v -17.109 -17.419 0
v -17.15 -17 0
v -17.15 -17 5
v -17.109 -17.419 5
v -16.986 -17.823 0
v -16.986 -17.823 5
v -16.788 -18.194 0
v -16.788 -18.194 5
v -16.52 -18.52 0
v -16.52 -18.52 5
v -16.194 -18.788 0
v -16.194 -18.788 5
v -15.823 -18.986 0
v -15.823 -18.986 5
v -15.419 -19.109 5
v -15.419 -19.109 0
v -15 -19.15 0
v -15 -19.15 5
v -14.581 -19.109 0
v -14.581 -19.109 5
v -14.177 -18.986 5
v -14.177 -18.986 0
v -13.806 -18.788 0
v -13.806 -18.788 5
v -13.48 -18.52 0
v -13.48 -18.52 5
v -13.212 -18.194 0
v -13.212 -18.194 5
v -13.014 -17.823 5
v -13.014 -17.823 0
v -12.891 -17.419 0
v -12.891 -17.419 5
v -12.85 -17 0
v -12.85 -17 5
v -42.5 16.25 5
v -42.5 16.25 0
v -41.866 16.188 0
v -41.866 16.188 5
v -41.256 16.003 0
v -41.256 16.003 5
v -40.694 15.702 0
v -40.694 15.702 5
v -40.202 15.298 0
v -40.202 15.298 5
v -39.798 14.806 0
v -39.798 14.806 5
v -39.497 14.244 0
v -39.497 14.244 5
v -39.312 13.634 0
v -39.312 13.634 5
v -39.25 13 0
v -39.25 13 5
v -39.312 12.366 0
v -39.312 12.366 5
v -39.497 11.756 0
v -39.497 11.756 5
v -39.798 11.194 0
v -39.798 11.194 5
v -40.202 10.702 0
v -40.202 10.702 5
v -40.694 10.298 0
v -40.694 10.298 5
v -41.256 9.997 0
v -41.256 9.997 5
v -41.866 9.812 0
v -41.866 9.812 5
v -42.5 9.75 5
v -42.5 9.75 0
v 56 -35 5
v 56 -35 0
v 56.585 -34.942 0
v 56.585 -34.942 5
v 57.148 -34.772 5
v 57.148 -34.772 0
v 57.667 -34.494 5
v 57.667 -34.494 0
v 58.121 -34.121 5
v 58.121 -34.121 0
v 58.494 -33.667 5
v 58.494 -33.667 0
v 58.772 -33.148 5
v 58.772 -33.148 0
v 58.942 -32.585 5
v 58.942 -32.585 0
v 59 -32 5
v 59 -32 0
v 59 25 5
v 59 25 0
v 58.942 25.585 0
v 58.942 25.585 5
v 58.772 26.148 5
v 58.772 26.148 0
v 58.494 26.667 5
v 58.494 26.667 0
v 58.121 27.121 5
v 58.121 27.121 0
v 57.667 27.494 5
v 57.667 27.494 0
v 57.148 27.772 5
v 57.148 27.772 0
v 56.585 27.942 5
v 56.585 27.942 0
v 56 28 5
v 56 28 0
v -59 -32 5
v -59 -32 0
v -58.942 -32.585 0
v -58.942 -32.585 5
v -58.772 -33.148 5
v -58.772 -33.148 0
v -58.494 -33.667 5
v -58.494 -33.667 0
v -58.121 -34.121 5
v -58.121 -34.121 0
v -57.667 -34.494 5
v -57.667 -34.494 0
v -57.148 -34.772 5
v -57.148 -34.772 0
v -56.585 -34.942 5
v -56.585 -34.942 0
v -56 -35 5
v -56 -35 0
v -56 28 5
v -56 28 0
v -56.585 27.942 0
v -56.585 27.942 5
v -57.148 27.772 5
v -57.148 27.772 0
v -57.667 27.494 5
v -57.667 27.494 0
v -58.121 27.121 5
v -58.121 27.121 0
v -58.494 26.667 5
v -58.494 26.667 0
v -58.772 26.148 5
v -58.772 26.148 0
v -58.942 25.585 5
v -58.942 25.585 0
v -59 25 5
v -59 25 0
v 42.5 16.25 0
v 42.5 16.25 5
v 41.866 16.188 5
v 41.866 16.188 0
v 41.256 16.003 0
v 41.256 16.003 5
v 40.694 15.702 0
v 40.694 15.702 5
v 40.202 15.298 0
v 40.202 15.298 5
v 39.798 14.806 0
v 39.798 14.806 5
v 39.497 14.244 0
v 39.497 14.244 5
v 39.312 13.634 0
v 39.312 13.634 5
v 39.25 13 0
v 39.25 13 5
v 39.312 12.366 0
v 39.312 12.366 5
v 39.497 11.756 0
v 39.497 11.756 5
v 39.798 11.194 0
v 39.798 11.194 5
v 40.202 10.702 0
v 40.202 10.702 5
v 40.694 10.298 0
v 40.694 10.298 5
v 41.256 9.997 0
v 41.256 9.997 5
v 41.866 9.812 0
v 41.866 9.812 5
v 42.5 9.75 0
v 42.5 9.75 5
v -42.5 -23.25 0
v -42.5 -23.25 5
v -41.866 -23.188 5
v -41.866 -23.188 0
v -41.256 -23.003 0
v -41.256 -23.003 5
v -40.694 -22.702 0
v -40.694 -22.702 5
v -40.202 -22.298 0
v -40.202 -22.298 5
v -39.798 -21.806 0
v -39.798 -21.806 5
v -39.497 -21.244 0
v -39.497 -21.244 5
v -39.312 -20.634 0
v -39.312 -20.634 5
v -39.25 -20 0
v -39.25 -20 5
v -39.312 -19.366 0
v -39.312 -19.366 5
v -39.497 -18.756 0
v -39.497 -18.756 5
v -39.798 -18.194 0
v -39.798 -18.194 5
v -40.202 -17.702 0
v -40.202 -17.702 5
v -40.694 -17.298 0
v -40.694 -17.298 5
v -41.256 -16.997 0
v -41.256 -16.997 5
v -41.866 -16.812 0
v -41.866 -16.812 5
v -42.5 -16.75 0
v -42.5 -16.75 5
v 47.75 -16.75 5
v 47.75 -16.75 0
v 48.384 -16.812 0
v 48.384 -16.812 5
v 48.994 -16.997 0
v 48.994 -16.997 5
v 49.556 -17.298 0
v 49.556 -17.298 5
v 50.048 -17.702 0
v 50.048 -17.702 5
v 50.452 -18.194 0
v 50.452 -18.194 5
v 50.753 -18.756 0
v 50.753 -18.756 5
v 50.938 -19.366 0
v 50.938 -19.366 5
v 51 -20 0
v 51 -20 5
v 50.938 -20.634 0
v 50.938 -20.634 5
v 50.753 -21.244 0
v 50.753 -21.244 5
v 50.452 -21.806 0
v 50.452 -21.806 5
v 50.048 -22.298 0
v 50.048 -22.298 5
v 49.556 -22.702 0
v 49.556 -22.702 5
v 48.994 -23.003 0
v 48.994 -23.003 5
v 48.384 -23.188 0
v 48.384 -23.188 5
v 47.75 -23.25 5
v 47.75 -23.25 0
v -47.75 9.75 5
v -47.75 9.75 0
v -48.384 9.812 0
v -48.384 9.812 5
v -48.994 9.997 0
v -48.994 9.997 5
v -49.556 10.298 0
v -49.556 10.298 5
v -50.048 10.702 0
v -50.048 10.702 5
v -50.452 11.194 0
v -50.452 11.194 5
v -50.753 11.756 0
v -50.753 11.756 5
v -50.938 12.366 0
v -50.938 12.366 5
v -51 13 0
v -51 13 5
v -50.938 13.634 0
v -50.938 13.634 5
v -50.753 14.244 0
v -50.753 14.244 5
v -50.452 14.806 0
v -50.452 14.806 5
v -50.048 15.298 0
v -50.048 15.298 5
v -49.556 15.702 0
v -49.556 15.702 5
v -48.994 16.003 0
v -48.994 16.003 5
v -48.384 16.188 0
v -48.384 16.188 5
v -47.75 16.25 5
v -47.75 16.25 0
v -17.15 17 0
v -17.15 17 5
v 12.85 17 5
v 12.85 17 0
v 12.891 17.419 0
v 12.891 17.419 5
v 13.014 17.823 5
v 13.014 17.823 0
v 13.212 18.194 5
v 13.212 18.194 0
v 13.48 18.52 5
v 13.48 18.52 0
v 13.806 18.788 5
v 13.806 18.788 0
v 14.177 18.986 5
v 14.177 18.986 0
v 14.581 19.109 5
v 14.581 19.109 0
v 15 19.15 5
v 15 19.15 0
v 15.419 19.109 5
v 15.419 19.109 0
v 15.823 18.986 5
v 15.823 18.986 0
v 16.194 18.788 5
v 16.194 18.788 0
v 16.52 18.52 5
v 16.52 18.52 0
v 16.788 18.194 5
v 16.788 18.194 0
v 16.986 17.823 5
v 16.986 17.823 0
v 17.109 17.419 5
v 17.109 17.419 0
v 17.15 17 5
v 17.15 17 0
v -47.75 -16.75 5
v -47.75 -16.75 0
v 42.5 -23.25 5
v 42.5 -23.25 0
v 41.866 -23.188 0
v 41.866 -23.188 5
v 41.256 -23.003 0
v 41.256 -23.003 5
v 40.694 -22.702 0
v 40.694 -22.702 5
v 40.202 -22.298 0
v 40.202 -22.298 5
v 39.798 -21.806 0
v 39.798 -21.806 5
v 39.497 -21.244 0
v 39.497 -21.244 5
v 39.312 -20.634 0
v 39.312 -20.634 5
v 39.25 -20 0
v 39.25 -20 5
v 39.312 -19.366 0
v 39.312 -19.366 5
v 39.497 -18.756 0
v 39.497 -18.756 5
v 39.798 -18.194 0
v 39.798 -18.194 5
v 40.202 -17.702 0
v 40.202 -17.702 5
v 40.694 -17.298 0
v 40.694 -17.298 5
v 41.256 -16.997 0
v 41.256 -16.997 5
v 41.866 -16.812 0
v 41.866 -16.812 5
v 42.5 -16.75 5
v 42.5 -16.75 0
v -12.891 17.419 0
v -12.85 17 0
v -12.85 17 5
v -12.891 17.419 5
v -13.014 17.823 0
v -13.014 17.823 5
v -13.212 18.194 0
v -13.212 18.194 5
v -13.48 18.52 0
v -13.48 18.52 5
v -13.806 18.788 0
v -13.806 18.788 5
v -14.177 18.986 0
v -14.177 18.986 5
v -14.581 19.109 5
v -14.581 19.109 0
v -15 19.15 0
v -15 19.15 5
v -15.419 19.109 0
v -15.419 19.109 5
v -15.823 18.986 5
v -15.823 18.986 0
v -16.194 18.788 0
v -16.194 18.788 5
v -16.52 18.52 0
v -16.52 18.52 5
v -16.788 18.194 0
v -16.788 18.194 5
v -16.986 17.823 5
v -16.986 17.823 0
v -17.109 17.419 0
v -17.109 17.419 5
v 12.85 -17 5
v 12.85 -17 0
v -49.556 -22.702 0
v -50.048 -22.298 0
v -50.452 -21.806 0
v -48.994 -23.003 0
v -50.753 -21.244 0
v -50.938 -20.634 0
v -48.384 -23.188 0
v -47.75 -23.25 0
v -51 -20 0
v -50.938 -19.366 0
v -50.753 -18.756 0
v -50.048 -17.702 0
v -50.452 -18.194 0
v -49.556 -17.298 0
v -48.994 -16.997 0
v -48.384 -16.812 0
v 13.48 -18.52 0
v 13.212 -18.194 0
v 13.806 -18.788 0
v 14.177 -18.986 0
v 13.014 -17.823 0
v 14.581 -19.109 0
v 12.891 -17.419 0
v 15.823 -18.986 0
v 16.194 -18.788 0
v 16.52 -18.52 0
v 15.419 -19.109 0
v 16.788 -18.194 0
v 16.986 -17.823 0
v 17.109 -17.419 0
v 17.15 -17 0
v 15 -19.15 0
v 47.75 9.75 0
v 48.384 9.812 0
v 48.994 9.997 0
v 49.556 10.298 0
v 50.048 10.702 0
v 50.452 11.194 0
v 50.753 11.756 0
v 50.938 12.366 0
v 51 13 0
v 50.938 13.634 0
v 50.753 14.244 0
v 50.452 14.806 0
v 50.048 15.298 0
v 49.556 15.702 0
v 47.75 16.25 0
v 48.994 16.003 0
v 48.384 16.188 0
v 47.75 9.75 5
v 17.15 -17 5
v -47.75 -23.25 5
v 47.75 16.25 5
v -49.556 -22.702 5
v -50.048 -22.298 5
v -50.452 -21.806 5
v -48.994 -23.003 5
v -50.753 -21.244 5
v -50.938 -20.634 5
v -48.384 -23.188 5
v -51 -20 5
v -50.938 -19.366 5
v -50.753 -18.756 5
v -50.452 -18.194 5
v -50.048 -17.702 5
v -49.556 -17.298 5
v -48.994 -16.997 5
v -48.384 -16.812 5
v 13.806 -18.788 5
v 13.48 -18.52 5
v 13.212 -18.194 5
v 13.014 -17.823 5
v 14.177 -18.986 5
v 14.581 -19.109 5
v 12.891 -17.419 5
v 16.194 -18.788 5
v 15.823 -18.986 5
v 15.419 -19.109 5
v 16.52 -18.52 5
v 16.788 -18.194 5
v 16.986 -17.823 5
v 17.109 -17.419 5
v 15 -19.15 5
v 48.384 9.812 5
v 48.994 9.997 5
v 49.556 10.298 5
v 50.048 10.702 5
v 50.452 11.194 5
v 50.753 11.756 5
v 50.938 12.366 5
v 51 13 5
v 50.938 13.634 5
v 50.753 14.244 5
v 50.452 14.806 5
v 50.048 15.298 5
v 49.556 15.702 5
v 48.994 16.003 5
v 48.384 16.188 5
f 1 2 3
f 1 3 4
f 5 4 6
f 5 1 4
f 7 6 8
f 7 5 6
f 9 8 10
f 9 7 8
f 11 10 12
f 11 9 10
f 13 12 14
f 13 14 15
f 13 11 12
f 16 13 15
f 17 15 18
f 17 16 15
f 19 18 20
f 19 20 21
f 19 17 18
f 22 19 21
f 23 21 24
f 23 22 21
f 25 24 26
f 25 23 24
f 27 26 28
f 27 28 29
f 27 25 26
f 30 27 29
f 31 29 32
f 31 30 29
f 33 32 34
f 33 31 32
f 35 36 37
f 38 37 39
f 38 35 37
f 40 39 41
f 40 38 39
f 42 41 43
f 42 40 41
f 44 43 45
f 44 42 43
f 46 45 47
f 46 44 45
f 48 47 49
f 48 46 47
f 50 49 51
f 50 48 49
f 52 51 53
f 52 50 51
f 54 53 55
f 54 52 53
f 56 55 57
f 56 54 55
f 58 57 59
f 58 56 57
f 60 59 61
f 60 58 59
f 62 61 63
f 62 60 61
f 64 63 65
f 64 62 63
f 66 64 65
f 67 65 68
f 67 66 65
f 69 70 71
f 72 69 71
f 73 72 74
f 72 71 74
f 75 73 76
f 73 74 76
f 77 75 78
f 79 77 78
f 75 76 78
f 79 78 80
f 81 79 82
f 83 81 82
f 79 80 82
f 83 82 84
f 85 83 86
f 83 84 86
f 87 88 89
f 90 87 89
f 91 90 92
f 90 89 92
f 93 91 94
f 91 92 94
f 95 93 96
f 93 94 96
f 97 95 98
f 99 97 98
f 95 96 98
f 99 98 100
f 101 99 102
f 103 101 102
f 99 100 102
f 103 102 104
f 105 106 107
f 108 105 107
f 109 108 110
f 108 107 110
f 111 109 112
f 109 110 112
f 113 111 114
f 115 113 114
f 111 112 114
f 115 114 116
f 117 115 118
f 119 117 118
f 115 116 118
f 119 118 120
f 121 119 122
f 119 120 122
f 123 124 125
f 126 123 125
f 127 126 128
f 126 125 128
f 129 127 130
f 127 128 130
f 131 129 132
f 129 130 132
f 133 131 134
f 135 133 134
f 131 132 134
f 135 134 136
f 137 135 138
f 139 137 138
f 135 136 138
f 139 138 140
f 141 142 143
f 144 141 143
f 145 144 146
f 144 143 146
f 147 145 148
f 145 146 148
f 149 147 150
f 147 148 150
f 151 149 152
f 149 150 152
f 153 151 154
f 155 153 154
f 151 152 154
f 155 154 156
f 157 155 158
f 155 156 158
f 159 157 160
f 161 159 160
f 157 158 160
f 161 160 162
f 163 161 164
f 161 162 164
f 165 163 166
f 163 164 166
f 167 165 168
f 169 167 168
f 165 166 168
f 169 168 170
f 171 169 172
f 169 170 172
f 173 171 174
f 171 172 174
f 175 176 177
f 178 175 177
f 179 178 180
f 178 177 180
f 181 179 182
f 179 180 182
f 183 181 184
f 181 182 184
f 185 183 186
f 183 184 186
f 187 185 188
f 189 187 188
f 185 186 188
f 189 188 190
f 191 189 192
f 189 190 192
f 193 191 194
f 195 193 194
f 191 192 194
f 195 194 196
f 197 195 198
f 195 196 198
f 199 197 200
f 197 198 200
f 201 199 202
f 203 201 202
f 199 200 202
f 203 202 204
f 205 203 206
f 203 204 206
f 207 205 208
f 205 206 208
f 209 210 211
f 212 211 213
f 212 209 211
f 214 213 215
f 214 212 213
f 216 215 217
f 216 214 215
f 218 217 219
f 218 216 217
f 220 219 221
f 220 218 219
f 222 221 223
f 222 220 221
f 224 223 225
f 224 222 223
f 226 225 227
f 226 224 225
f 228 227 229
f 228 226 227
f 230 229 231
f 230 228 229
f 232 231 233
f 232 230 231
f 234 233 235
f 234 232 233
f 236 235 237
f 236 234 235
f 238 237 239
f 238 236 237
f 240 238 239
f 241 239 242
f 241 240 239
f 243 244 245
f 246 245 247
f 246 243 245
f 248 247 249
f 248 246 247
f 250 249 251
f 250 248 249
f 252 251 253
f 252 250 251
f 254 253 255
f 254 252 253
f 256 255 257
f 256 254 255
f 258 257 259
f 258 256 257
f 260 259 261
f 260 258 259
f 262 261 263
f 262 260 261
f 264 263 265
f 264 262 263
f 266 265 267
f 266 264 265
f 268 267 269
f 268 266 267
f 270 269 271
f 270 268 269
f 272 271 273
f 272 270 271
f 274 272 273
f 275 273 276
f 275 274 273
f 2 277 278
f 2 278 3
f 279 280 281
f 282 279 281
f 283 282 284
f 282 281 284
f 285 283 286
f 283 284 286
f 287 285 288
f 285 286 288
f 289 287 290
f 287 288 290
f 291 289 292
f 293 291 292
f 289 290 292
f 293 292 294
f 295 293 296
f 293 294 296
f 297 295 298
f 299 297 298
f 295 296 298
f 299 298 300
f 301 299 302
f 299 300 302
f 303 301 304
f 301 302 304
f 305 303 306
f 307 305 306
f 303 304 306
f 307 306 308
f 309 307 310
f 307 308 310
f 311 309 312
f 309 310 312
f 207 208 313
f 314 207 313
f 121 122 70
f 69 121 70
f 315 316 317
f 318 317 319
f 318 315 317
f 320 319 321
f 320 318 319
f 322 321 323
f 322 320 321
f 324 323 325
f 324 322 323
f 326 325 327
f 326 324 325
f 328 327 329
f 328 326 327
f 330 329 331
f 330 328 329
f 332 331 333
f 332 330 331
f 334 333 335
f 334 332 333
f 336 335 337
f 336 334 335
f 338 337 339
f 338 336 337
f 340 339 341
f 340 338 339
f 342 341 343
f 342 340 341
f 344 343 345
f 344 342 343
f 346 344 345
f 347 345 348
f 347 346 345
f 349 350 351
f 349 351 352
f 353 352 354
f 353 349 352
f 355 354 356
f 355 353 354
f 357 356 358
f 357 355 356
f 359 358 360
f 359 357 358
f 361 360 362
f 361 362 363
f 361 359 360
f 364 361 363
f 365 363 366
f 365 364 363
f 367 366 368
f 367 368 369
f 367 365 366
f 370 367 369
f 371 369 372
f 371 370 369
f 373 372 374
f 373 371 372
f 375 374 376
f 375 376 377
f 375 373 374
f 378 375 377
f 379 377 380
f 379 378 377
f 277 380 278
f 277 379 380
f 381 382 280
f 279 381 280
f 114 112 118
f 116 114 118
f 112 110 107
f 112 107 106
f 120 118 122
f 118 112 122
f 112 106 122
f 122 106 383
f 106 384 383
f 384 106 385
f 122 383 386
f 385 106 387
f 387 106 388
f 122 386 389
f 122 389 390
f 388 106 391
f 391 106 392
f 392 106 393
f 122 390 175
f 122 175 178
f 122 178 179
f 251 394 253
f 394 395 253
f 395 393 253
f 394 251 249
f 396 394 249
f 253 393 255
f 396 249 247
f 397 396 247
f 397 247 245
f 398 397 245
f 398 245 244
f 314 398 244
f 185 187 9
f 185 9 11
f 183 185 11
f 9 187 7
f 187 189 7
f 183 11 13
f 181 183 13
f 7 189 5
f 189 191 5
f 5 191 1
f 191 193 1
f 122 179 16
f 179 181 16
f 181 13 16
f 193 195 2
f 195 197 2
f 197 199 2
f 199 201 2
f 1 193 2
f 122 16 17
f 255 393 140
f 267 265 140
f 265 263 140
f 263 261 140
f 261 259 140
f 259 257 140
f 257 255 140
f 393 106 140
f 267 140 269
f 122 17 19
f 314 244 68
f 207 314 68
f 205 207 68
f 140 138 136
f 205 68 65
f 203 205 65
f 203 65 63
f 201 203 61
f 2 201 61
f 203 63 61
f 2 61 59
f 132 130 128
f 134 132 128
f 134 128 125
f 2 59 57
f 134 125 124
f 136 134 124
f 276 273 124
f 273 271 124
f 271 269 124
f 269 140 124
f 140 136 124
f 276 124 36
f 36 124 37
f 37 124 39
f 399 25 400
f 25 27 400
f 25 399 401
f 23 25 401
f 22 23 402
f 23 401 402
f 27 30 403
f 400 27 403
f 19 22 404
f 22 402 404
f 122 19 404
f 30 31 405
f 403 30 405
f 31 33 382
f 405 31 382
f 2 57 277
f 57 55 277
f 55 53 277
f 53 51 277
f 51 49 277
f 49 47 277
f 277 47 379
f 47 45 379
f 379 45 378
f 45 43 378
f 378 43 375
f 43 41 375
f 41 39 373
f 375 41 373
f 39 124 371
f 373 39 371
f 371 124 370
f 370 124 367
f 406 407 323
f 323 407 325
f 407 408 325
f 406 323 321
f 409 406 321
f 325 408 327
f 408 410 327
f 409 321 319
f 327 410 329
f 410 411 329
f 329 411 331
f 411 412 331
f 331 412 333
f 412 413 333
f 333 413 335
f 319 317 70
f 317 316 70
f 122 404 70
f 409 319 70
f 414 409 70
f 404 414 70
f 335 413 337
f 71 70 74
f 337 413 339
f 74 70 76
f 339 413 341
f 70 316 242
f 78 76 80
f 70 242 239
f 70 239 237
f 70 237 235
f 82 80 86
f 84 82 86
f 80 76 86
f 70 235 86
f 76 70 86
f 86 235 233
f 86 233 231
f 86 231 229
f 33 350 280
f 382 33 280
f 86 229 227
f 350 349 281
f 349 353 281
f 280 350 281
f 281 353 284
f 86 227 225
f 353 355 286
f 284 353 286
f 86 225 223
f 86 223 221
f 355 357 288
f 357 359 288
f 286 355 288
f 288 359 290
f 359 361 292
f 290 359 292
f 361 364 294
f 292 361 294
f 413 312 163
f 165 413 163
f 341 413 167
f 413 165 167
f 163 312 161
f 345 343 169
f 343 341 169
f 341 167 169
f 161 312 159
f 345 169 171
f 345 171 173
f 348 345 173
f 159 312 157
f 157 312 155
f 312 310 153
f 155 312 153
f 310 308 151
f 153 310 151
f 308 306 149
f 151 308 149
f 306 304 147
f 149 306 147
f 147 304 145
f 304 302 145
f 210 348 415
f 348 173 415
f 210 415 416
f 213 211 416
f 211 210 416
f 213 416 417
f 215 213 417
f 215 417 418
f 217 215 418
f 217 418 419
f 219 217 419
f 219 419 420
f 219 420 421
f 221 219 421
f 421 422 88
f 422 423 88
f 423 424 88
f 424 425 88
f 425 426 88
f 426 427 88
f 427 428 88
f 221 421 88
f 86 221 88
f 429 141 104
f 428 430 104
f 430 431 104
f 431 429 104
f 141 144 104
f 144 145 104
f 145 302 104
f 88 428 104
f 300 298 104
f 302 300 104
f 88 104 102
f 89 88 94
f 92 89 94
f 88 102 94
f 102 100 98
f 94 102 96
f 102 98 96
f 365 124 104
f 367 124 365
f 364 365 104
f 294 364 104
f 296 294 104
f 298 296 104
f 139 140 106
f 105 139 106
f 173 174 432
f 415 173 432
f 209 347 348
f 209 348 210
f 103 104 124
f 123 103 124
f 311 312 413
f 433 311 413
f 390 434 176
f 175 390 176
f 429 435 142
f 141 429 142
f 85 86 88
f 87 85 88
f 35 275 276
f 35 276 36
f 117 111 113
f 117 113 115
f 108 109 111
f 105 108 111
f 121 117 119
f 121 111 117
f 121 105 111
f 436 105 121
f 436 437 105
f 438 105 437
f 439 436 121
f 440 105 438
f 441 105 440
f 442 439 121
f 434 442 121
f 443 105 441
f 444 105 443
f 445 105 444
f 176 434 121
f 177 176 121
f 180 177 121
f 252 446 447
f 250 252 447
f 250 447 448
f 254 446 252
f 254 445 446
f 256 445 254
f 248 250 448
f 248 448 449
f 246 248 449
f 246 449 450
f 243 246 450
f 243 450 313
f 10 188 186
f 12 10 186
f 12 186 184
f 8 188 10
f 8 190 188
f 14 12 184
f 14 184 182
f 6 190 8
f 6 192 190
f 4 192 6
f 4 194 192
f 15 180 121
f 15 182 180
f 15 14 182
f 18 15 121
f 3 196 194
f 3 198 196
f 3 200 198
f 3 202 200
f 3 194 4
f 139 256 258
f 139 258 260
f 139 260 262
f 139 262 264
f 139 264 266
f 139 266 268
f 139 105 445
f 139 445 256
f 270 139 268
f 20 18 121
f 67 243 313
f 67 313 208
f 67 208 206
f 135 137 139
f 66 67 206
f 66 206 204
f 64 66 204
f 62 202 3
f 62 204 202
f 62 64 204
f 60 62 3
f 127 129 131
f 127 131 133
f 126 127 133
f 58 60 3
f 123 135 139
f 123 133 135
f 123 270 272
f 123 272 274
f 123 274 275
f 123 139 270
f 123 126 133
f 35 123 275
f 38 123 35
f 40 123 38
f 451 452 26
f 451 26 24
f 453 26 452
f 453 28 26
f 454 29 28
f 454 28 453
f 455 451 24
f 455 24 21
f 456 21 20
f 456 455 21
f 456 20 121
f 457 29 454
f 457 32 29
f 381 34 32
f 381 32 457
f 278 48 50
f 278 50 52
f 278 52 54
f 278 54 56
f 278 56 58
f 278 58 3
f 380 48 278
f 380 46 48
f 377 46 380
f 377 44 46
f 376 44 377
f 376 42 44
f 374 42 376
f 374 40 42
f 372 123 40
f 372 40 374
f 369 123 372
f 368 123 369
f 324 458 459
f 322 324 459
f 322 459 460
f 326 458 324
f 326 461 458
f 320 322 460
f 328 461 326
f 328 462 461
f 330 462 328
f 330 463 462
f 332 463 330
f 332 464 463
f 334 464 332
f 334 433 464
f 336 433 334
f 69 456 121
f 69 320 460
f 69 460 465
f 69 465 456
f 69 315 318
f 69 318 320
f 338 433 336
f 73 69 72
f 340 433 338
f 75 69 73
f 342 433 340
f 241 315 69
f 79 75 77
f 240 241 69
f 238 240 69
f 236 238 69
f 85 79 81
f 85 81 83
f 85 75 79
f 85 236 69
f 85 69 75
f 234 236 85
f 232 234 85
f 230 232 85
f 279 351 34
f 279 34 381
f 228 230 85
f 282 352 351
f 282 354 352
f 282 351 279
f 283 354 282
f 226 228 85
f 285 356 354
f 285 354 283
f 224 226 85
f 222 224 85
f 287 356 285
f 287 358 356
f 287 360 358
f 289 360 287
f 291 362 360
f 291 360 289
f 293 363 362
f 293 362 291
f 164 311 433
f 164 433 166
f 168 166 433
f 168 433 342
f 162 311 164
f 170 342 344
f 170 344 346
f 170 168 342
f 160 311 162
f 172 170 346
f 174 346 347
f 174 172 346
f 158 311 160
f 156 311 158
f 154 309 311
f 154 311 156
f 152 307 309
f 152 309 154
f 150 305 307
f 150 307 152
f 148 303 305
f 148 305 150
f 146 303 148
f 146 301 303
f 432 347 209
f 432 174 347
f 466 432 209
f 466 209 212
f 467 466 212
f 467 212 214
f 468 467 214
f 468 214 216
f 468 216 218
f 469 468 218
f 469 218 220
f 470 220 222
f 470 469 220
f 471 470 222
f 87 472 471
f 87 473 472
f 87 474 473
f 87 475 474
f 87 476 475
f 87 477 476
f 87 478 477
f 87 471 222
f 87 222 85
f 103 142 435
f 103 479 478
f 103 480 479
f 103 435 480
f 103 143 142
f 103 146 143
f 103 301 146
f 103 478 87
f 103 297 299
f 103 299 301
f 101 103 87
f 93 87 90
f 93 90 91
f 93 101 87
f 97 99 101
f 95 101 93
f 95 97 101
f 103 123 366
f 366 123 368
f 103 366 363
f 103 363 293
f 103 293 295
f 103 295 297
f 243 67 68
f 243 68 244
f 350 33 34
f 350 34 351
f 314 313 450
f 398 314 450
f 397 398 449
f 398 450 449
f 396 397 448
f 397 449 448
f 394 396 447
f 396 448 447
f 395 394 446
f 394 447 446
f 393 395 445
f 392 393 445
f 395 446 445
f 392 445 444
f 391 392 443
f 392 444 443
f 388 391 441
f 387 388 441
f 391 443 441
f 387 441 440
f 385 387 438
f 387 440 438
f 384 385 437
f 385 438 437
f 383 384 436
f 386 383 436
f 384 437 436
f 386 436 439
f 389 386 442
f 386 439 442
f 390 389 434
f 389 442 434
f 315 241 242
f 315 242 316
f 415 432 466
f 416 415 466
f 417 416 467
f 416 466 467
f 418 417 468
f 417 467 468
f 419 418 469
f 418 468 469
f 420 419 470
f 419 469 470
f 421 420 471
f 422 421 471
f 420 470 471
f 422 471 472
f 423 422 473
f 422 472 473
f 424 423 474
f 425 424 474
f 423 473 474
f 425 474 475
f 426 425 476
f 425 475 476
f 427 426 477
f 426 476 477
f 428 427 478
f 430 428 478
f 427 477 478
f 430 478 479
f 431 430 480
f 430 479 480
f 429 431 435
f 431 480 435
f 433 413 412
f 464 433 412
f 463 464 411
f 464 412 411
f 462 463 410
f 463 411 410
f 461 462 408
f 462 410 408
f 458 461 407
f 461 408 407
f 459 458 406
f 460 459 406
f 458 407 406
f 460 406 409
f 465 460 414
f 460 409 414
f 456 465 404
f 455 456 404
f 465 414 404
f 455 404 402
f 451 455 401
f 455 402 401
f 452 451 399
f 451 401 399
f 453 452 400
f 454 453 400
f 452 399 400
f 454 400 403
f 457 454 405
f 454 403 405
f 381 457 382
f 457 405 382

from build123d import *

# Parameters (mm, degrees)
EXTRUDE_1_DEPTH     = 5
CUT_EXTRUDE_1_DEPTH = 10


with BuildPart() as part:
    # 草图1 → 凸台-拉伸1 (new body)
    with BuildSketch(Plane.XY):
        with BuildLine():
            Line((-59, -25), (-59, -32))
            ThreePointArc((-59, -32), (-58.121320344, -34.121320344), (-56, -35))
            Line((-56, -35), (56, -35))
            ThreePointArc((56, -35), (58.121320344, -34.121320344), (59, -32))
            Line((59, -32), (59, -25))
            Line((59, -25), (59, 25))
            ThreePointArc((59, 25), (58.121320344, 27.121320344), (56, 28))
            Line((56, 28), (-56, 28))
            ThreePointArc((-56, 28), (-58.121320344, 27.121320344), (-59, 25))
            Line((-59, 25), (-59, -25))
        make_face()
        with BuildLine():
            Line((12.85, -17), (12.85, 17))
            ThreePointArc((12.85, 17), (15, 19.15), (17.15, 17))
            Line((17.15, 17), (17.15, -17))
            ThreePointArc((17.15, -17), (15, -19.15), (12.85, -17))
        make_face(mode=Mode.SUBTRACT)
        with BuildLine():
            Line((-12.85, -17), (-12.85, 17))
            ThreePointArc((-12.85, 17), (-15, 19.15), (-17.15, 17))
            Line((-17.15, 17), (-17.15, -17))
            ThreePointArc((-17.15, -17), (-15, -19.15), (-12.85, -17))
        make_face(mode=Mode.SUBTRACT)
    extrude(amount=EXTRUDE_1_DEPTH)

    # 草图2 → 切除-拉伸1 (cut)
    with BuildSketch(Plane.XY.offset(5)):
        with BuildLine():
            Line((-47.75, 16.25), (-42.5, 16.25))
            ThreePointArc((-42.5, 16.25), (-39.25, 13), (-42.5, 9.75))
            Line((-42.5, 9.75), (-47.75, 9.75))
            ThreePointArc((-47.75, 9.75), (-51, 13), (-47.75, 16.25))
        make_face()
        with BuildLine():
            Line((-47.75, -23.25), (-42.5, -23.25))
            ThreePointArc((-42.5, -23.25), (-39.25, -20), (-42.5, -16.75))
            Line((-42.5, -16.75), (-47.75, -16.75))
            ThreePointArc((-47.75, -16.75), (-51, -20), (-47.75, -23.25))
        make_face()
        with BuildLine():
            Line((47.75, 16.25), (42.5, 16.25))
            ThreePointArc((42.5, 16.25), (39.25, 13), (42.5, 9.75))
            Line((42.5, 9.75), (47.75, 9.75))
            ThreePointArc((47.75, 9.75), (51, 13), (47.75, 16.25))
        make_face()
        with BuildLine():
            Line((47.75, -23.25), (42.5, -23.25))
            ThreePointArc((42.5, -23.25), (39.25, -20), (42.5, -16.75))
            Line((42.5, -16.75), (47.75, -16.75))
            ThreePointArc((47.75, -16.75), (51, -20), (47.75, -23.25))
        make_face()
    extrude(amount=-CUT_EXTRUDE_1_DEPTH, mode=Mode.SUBTRACT)


solid = part.part
